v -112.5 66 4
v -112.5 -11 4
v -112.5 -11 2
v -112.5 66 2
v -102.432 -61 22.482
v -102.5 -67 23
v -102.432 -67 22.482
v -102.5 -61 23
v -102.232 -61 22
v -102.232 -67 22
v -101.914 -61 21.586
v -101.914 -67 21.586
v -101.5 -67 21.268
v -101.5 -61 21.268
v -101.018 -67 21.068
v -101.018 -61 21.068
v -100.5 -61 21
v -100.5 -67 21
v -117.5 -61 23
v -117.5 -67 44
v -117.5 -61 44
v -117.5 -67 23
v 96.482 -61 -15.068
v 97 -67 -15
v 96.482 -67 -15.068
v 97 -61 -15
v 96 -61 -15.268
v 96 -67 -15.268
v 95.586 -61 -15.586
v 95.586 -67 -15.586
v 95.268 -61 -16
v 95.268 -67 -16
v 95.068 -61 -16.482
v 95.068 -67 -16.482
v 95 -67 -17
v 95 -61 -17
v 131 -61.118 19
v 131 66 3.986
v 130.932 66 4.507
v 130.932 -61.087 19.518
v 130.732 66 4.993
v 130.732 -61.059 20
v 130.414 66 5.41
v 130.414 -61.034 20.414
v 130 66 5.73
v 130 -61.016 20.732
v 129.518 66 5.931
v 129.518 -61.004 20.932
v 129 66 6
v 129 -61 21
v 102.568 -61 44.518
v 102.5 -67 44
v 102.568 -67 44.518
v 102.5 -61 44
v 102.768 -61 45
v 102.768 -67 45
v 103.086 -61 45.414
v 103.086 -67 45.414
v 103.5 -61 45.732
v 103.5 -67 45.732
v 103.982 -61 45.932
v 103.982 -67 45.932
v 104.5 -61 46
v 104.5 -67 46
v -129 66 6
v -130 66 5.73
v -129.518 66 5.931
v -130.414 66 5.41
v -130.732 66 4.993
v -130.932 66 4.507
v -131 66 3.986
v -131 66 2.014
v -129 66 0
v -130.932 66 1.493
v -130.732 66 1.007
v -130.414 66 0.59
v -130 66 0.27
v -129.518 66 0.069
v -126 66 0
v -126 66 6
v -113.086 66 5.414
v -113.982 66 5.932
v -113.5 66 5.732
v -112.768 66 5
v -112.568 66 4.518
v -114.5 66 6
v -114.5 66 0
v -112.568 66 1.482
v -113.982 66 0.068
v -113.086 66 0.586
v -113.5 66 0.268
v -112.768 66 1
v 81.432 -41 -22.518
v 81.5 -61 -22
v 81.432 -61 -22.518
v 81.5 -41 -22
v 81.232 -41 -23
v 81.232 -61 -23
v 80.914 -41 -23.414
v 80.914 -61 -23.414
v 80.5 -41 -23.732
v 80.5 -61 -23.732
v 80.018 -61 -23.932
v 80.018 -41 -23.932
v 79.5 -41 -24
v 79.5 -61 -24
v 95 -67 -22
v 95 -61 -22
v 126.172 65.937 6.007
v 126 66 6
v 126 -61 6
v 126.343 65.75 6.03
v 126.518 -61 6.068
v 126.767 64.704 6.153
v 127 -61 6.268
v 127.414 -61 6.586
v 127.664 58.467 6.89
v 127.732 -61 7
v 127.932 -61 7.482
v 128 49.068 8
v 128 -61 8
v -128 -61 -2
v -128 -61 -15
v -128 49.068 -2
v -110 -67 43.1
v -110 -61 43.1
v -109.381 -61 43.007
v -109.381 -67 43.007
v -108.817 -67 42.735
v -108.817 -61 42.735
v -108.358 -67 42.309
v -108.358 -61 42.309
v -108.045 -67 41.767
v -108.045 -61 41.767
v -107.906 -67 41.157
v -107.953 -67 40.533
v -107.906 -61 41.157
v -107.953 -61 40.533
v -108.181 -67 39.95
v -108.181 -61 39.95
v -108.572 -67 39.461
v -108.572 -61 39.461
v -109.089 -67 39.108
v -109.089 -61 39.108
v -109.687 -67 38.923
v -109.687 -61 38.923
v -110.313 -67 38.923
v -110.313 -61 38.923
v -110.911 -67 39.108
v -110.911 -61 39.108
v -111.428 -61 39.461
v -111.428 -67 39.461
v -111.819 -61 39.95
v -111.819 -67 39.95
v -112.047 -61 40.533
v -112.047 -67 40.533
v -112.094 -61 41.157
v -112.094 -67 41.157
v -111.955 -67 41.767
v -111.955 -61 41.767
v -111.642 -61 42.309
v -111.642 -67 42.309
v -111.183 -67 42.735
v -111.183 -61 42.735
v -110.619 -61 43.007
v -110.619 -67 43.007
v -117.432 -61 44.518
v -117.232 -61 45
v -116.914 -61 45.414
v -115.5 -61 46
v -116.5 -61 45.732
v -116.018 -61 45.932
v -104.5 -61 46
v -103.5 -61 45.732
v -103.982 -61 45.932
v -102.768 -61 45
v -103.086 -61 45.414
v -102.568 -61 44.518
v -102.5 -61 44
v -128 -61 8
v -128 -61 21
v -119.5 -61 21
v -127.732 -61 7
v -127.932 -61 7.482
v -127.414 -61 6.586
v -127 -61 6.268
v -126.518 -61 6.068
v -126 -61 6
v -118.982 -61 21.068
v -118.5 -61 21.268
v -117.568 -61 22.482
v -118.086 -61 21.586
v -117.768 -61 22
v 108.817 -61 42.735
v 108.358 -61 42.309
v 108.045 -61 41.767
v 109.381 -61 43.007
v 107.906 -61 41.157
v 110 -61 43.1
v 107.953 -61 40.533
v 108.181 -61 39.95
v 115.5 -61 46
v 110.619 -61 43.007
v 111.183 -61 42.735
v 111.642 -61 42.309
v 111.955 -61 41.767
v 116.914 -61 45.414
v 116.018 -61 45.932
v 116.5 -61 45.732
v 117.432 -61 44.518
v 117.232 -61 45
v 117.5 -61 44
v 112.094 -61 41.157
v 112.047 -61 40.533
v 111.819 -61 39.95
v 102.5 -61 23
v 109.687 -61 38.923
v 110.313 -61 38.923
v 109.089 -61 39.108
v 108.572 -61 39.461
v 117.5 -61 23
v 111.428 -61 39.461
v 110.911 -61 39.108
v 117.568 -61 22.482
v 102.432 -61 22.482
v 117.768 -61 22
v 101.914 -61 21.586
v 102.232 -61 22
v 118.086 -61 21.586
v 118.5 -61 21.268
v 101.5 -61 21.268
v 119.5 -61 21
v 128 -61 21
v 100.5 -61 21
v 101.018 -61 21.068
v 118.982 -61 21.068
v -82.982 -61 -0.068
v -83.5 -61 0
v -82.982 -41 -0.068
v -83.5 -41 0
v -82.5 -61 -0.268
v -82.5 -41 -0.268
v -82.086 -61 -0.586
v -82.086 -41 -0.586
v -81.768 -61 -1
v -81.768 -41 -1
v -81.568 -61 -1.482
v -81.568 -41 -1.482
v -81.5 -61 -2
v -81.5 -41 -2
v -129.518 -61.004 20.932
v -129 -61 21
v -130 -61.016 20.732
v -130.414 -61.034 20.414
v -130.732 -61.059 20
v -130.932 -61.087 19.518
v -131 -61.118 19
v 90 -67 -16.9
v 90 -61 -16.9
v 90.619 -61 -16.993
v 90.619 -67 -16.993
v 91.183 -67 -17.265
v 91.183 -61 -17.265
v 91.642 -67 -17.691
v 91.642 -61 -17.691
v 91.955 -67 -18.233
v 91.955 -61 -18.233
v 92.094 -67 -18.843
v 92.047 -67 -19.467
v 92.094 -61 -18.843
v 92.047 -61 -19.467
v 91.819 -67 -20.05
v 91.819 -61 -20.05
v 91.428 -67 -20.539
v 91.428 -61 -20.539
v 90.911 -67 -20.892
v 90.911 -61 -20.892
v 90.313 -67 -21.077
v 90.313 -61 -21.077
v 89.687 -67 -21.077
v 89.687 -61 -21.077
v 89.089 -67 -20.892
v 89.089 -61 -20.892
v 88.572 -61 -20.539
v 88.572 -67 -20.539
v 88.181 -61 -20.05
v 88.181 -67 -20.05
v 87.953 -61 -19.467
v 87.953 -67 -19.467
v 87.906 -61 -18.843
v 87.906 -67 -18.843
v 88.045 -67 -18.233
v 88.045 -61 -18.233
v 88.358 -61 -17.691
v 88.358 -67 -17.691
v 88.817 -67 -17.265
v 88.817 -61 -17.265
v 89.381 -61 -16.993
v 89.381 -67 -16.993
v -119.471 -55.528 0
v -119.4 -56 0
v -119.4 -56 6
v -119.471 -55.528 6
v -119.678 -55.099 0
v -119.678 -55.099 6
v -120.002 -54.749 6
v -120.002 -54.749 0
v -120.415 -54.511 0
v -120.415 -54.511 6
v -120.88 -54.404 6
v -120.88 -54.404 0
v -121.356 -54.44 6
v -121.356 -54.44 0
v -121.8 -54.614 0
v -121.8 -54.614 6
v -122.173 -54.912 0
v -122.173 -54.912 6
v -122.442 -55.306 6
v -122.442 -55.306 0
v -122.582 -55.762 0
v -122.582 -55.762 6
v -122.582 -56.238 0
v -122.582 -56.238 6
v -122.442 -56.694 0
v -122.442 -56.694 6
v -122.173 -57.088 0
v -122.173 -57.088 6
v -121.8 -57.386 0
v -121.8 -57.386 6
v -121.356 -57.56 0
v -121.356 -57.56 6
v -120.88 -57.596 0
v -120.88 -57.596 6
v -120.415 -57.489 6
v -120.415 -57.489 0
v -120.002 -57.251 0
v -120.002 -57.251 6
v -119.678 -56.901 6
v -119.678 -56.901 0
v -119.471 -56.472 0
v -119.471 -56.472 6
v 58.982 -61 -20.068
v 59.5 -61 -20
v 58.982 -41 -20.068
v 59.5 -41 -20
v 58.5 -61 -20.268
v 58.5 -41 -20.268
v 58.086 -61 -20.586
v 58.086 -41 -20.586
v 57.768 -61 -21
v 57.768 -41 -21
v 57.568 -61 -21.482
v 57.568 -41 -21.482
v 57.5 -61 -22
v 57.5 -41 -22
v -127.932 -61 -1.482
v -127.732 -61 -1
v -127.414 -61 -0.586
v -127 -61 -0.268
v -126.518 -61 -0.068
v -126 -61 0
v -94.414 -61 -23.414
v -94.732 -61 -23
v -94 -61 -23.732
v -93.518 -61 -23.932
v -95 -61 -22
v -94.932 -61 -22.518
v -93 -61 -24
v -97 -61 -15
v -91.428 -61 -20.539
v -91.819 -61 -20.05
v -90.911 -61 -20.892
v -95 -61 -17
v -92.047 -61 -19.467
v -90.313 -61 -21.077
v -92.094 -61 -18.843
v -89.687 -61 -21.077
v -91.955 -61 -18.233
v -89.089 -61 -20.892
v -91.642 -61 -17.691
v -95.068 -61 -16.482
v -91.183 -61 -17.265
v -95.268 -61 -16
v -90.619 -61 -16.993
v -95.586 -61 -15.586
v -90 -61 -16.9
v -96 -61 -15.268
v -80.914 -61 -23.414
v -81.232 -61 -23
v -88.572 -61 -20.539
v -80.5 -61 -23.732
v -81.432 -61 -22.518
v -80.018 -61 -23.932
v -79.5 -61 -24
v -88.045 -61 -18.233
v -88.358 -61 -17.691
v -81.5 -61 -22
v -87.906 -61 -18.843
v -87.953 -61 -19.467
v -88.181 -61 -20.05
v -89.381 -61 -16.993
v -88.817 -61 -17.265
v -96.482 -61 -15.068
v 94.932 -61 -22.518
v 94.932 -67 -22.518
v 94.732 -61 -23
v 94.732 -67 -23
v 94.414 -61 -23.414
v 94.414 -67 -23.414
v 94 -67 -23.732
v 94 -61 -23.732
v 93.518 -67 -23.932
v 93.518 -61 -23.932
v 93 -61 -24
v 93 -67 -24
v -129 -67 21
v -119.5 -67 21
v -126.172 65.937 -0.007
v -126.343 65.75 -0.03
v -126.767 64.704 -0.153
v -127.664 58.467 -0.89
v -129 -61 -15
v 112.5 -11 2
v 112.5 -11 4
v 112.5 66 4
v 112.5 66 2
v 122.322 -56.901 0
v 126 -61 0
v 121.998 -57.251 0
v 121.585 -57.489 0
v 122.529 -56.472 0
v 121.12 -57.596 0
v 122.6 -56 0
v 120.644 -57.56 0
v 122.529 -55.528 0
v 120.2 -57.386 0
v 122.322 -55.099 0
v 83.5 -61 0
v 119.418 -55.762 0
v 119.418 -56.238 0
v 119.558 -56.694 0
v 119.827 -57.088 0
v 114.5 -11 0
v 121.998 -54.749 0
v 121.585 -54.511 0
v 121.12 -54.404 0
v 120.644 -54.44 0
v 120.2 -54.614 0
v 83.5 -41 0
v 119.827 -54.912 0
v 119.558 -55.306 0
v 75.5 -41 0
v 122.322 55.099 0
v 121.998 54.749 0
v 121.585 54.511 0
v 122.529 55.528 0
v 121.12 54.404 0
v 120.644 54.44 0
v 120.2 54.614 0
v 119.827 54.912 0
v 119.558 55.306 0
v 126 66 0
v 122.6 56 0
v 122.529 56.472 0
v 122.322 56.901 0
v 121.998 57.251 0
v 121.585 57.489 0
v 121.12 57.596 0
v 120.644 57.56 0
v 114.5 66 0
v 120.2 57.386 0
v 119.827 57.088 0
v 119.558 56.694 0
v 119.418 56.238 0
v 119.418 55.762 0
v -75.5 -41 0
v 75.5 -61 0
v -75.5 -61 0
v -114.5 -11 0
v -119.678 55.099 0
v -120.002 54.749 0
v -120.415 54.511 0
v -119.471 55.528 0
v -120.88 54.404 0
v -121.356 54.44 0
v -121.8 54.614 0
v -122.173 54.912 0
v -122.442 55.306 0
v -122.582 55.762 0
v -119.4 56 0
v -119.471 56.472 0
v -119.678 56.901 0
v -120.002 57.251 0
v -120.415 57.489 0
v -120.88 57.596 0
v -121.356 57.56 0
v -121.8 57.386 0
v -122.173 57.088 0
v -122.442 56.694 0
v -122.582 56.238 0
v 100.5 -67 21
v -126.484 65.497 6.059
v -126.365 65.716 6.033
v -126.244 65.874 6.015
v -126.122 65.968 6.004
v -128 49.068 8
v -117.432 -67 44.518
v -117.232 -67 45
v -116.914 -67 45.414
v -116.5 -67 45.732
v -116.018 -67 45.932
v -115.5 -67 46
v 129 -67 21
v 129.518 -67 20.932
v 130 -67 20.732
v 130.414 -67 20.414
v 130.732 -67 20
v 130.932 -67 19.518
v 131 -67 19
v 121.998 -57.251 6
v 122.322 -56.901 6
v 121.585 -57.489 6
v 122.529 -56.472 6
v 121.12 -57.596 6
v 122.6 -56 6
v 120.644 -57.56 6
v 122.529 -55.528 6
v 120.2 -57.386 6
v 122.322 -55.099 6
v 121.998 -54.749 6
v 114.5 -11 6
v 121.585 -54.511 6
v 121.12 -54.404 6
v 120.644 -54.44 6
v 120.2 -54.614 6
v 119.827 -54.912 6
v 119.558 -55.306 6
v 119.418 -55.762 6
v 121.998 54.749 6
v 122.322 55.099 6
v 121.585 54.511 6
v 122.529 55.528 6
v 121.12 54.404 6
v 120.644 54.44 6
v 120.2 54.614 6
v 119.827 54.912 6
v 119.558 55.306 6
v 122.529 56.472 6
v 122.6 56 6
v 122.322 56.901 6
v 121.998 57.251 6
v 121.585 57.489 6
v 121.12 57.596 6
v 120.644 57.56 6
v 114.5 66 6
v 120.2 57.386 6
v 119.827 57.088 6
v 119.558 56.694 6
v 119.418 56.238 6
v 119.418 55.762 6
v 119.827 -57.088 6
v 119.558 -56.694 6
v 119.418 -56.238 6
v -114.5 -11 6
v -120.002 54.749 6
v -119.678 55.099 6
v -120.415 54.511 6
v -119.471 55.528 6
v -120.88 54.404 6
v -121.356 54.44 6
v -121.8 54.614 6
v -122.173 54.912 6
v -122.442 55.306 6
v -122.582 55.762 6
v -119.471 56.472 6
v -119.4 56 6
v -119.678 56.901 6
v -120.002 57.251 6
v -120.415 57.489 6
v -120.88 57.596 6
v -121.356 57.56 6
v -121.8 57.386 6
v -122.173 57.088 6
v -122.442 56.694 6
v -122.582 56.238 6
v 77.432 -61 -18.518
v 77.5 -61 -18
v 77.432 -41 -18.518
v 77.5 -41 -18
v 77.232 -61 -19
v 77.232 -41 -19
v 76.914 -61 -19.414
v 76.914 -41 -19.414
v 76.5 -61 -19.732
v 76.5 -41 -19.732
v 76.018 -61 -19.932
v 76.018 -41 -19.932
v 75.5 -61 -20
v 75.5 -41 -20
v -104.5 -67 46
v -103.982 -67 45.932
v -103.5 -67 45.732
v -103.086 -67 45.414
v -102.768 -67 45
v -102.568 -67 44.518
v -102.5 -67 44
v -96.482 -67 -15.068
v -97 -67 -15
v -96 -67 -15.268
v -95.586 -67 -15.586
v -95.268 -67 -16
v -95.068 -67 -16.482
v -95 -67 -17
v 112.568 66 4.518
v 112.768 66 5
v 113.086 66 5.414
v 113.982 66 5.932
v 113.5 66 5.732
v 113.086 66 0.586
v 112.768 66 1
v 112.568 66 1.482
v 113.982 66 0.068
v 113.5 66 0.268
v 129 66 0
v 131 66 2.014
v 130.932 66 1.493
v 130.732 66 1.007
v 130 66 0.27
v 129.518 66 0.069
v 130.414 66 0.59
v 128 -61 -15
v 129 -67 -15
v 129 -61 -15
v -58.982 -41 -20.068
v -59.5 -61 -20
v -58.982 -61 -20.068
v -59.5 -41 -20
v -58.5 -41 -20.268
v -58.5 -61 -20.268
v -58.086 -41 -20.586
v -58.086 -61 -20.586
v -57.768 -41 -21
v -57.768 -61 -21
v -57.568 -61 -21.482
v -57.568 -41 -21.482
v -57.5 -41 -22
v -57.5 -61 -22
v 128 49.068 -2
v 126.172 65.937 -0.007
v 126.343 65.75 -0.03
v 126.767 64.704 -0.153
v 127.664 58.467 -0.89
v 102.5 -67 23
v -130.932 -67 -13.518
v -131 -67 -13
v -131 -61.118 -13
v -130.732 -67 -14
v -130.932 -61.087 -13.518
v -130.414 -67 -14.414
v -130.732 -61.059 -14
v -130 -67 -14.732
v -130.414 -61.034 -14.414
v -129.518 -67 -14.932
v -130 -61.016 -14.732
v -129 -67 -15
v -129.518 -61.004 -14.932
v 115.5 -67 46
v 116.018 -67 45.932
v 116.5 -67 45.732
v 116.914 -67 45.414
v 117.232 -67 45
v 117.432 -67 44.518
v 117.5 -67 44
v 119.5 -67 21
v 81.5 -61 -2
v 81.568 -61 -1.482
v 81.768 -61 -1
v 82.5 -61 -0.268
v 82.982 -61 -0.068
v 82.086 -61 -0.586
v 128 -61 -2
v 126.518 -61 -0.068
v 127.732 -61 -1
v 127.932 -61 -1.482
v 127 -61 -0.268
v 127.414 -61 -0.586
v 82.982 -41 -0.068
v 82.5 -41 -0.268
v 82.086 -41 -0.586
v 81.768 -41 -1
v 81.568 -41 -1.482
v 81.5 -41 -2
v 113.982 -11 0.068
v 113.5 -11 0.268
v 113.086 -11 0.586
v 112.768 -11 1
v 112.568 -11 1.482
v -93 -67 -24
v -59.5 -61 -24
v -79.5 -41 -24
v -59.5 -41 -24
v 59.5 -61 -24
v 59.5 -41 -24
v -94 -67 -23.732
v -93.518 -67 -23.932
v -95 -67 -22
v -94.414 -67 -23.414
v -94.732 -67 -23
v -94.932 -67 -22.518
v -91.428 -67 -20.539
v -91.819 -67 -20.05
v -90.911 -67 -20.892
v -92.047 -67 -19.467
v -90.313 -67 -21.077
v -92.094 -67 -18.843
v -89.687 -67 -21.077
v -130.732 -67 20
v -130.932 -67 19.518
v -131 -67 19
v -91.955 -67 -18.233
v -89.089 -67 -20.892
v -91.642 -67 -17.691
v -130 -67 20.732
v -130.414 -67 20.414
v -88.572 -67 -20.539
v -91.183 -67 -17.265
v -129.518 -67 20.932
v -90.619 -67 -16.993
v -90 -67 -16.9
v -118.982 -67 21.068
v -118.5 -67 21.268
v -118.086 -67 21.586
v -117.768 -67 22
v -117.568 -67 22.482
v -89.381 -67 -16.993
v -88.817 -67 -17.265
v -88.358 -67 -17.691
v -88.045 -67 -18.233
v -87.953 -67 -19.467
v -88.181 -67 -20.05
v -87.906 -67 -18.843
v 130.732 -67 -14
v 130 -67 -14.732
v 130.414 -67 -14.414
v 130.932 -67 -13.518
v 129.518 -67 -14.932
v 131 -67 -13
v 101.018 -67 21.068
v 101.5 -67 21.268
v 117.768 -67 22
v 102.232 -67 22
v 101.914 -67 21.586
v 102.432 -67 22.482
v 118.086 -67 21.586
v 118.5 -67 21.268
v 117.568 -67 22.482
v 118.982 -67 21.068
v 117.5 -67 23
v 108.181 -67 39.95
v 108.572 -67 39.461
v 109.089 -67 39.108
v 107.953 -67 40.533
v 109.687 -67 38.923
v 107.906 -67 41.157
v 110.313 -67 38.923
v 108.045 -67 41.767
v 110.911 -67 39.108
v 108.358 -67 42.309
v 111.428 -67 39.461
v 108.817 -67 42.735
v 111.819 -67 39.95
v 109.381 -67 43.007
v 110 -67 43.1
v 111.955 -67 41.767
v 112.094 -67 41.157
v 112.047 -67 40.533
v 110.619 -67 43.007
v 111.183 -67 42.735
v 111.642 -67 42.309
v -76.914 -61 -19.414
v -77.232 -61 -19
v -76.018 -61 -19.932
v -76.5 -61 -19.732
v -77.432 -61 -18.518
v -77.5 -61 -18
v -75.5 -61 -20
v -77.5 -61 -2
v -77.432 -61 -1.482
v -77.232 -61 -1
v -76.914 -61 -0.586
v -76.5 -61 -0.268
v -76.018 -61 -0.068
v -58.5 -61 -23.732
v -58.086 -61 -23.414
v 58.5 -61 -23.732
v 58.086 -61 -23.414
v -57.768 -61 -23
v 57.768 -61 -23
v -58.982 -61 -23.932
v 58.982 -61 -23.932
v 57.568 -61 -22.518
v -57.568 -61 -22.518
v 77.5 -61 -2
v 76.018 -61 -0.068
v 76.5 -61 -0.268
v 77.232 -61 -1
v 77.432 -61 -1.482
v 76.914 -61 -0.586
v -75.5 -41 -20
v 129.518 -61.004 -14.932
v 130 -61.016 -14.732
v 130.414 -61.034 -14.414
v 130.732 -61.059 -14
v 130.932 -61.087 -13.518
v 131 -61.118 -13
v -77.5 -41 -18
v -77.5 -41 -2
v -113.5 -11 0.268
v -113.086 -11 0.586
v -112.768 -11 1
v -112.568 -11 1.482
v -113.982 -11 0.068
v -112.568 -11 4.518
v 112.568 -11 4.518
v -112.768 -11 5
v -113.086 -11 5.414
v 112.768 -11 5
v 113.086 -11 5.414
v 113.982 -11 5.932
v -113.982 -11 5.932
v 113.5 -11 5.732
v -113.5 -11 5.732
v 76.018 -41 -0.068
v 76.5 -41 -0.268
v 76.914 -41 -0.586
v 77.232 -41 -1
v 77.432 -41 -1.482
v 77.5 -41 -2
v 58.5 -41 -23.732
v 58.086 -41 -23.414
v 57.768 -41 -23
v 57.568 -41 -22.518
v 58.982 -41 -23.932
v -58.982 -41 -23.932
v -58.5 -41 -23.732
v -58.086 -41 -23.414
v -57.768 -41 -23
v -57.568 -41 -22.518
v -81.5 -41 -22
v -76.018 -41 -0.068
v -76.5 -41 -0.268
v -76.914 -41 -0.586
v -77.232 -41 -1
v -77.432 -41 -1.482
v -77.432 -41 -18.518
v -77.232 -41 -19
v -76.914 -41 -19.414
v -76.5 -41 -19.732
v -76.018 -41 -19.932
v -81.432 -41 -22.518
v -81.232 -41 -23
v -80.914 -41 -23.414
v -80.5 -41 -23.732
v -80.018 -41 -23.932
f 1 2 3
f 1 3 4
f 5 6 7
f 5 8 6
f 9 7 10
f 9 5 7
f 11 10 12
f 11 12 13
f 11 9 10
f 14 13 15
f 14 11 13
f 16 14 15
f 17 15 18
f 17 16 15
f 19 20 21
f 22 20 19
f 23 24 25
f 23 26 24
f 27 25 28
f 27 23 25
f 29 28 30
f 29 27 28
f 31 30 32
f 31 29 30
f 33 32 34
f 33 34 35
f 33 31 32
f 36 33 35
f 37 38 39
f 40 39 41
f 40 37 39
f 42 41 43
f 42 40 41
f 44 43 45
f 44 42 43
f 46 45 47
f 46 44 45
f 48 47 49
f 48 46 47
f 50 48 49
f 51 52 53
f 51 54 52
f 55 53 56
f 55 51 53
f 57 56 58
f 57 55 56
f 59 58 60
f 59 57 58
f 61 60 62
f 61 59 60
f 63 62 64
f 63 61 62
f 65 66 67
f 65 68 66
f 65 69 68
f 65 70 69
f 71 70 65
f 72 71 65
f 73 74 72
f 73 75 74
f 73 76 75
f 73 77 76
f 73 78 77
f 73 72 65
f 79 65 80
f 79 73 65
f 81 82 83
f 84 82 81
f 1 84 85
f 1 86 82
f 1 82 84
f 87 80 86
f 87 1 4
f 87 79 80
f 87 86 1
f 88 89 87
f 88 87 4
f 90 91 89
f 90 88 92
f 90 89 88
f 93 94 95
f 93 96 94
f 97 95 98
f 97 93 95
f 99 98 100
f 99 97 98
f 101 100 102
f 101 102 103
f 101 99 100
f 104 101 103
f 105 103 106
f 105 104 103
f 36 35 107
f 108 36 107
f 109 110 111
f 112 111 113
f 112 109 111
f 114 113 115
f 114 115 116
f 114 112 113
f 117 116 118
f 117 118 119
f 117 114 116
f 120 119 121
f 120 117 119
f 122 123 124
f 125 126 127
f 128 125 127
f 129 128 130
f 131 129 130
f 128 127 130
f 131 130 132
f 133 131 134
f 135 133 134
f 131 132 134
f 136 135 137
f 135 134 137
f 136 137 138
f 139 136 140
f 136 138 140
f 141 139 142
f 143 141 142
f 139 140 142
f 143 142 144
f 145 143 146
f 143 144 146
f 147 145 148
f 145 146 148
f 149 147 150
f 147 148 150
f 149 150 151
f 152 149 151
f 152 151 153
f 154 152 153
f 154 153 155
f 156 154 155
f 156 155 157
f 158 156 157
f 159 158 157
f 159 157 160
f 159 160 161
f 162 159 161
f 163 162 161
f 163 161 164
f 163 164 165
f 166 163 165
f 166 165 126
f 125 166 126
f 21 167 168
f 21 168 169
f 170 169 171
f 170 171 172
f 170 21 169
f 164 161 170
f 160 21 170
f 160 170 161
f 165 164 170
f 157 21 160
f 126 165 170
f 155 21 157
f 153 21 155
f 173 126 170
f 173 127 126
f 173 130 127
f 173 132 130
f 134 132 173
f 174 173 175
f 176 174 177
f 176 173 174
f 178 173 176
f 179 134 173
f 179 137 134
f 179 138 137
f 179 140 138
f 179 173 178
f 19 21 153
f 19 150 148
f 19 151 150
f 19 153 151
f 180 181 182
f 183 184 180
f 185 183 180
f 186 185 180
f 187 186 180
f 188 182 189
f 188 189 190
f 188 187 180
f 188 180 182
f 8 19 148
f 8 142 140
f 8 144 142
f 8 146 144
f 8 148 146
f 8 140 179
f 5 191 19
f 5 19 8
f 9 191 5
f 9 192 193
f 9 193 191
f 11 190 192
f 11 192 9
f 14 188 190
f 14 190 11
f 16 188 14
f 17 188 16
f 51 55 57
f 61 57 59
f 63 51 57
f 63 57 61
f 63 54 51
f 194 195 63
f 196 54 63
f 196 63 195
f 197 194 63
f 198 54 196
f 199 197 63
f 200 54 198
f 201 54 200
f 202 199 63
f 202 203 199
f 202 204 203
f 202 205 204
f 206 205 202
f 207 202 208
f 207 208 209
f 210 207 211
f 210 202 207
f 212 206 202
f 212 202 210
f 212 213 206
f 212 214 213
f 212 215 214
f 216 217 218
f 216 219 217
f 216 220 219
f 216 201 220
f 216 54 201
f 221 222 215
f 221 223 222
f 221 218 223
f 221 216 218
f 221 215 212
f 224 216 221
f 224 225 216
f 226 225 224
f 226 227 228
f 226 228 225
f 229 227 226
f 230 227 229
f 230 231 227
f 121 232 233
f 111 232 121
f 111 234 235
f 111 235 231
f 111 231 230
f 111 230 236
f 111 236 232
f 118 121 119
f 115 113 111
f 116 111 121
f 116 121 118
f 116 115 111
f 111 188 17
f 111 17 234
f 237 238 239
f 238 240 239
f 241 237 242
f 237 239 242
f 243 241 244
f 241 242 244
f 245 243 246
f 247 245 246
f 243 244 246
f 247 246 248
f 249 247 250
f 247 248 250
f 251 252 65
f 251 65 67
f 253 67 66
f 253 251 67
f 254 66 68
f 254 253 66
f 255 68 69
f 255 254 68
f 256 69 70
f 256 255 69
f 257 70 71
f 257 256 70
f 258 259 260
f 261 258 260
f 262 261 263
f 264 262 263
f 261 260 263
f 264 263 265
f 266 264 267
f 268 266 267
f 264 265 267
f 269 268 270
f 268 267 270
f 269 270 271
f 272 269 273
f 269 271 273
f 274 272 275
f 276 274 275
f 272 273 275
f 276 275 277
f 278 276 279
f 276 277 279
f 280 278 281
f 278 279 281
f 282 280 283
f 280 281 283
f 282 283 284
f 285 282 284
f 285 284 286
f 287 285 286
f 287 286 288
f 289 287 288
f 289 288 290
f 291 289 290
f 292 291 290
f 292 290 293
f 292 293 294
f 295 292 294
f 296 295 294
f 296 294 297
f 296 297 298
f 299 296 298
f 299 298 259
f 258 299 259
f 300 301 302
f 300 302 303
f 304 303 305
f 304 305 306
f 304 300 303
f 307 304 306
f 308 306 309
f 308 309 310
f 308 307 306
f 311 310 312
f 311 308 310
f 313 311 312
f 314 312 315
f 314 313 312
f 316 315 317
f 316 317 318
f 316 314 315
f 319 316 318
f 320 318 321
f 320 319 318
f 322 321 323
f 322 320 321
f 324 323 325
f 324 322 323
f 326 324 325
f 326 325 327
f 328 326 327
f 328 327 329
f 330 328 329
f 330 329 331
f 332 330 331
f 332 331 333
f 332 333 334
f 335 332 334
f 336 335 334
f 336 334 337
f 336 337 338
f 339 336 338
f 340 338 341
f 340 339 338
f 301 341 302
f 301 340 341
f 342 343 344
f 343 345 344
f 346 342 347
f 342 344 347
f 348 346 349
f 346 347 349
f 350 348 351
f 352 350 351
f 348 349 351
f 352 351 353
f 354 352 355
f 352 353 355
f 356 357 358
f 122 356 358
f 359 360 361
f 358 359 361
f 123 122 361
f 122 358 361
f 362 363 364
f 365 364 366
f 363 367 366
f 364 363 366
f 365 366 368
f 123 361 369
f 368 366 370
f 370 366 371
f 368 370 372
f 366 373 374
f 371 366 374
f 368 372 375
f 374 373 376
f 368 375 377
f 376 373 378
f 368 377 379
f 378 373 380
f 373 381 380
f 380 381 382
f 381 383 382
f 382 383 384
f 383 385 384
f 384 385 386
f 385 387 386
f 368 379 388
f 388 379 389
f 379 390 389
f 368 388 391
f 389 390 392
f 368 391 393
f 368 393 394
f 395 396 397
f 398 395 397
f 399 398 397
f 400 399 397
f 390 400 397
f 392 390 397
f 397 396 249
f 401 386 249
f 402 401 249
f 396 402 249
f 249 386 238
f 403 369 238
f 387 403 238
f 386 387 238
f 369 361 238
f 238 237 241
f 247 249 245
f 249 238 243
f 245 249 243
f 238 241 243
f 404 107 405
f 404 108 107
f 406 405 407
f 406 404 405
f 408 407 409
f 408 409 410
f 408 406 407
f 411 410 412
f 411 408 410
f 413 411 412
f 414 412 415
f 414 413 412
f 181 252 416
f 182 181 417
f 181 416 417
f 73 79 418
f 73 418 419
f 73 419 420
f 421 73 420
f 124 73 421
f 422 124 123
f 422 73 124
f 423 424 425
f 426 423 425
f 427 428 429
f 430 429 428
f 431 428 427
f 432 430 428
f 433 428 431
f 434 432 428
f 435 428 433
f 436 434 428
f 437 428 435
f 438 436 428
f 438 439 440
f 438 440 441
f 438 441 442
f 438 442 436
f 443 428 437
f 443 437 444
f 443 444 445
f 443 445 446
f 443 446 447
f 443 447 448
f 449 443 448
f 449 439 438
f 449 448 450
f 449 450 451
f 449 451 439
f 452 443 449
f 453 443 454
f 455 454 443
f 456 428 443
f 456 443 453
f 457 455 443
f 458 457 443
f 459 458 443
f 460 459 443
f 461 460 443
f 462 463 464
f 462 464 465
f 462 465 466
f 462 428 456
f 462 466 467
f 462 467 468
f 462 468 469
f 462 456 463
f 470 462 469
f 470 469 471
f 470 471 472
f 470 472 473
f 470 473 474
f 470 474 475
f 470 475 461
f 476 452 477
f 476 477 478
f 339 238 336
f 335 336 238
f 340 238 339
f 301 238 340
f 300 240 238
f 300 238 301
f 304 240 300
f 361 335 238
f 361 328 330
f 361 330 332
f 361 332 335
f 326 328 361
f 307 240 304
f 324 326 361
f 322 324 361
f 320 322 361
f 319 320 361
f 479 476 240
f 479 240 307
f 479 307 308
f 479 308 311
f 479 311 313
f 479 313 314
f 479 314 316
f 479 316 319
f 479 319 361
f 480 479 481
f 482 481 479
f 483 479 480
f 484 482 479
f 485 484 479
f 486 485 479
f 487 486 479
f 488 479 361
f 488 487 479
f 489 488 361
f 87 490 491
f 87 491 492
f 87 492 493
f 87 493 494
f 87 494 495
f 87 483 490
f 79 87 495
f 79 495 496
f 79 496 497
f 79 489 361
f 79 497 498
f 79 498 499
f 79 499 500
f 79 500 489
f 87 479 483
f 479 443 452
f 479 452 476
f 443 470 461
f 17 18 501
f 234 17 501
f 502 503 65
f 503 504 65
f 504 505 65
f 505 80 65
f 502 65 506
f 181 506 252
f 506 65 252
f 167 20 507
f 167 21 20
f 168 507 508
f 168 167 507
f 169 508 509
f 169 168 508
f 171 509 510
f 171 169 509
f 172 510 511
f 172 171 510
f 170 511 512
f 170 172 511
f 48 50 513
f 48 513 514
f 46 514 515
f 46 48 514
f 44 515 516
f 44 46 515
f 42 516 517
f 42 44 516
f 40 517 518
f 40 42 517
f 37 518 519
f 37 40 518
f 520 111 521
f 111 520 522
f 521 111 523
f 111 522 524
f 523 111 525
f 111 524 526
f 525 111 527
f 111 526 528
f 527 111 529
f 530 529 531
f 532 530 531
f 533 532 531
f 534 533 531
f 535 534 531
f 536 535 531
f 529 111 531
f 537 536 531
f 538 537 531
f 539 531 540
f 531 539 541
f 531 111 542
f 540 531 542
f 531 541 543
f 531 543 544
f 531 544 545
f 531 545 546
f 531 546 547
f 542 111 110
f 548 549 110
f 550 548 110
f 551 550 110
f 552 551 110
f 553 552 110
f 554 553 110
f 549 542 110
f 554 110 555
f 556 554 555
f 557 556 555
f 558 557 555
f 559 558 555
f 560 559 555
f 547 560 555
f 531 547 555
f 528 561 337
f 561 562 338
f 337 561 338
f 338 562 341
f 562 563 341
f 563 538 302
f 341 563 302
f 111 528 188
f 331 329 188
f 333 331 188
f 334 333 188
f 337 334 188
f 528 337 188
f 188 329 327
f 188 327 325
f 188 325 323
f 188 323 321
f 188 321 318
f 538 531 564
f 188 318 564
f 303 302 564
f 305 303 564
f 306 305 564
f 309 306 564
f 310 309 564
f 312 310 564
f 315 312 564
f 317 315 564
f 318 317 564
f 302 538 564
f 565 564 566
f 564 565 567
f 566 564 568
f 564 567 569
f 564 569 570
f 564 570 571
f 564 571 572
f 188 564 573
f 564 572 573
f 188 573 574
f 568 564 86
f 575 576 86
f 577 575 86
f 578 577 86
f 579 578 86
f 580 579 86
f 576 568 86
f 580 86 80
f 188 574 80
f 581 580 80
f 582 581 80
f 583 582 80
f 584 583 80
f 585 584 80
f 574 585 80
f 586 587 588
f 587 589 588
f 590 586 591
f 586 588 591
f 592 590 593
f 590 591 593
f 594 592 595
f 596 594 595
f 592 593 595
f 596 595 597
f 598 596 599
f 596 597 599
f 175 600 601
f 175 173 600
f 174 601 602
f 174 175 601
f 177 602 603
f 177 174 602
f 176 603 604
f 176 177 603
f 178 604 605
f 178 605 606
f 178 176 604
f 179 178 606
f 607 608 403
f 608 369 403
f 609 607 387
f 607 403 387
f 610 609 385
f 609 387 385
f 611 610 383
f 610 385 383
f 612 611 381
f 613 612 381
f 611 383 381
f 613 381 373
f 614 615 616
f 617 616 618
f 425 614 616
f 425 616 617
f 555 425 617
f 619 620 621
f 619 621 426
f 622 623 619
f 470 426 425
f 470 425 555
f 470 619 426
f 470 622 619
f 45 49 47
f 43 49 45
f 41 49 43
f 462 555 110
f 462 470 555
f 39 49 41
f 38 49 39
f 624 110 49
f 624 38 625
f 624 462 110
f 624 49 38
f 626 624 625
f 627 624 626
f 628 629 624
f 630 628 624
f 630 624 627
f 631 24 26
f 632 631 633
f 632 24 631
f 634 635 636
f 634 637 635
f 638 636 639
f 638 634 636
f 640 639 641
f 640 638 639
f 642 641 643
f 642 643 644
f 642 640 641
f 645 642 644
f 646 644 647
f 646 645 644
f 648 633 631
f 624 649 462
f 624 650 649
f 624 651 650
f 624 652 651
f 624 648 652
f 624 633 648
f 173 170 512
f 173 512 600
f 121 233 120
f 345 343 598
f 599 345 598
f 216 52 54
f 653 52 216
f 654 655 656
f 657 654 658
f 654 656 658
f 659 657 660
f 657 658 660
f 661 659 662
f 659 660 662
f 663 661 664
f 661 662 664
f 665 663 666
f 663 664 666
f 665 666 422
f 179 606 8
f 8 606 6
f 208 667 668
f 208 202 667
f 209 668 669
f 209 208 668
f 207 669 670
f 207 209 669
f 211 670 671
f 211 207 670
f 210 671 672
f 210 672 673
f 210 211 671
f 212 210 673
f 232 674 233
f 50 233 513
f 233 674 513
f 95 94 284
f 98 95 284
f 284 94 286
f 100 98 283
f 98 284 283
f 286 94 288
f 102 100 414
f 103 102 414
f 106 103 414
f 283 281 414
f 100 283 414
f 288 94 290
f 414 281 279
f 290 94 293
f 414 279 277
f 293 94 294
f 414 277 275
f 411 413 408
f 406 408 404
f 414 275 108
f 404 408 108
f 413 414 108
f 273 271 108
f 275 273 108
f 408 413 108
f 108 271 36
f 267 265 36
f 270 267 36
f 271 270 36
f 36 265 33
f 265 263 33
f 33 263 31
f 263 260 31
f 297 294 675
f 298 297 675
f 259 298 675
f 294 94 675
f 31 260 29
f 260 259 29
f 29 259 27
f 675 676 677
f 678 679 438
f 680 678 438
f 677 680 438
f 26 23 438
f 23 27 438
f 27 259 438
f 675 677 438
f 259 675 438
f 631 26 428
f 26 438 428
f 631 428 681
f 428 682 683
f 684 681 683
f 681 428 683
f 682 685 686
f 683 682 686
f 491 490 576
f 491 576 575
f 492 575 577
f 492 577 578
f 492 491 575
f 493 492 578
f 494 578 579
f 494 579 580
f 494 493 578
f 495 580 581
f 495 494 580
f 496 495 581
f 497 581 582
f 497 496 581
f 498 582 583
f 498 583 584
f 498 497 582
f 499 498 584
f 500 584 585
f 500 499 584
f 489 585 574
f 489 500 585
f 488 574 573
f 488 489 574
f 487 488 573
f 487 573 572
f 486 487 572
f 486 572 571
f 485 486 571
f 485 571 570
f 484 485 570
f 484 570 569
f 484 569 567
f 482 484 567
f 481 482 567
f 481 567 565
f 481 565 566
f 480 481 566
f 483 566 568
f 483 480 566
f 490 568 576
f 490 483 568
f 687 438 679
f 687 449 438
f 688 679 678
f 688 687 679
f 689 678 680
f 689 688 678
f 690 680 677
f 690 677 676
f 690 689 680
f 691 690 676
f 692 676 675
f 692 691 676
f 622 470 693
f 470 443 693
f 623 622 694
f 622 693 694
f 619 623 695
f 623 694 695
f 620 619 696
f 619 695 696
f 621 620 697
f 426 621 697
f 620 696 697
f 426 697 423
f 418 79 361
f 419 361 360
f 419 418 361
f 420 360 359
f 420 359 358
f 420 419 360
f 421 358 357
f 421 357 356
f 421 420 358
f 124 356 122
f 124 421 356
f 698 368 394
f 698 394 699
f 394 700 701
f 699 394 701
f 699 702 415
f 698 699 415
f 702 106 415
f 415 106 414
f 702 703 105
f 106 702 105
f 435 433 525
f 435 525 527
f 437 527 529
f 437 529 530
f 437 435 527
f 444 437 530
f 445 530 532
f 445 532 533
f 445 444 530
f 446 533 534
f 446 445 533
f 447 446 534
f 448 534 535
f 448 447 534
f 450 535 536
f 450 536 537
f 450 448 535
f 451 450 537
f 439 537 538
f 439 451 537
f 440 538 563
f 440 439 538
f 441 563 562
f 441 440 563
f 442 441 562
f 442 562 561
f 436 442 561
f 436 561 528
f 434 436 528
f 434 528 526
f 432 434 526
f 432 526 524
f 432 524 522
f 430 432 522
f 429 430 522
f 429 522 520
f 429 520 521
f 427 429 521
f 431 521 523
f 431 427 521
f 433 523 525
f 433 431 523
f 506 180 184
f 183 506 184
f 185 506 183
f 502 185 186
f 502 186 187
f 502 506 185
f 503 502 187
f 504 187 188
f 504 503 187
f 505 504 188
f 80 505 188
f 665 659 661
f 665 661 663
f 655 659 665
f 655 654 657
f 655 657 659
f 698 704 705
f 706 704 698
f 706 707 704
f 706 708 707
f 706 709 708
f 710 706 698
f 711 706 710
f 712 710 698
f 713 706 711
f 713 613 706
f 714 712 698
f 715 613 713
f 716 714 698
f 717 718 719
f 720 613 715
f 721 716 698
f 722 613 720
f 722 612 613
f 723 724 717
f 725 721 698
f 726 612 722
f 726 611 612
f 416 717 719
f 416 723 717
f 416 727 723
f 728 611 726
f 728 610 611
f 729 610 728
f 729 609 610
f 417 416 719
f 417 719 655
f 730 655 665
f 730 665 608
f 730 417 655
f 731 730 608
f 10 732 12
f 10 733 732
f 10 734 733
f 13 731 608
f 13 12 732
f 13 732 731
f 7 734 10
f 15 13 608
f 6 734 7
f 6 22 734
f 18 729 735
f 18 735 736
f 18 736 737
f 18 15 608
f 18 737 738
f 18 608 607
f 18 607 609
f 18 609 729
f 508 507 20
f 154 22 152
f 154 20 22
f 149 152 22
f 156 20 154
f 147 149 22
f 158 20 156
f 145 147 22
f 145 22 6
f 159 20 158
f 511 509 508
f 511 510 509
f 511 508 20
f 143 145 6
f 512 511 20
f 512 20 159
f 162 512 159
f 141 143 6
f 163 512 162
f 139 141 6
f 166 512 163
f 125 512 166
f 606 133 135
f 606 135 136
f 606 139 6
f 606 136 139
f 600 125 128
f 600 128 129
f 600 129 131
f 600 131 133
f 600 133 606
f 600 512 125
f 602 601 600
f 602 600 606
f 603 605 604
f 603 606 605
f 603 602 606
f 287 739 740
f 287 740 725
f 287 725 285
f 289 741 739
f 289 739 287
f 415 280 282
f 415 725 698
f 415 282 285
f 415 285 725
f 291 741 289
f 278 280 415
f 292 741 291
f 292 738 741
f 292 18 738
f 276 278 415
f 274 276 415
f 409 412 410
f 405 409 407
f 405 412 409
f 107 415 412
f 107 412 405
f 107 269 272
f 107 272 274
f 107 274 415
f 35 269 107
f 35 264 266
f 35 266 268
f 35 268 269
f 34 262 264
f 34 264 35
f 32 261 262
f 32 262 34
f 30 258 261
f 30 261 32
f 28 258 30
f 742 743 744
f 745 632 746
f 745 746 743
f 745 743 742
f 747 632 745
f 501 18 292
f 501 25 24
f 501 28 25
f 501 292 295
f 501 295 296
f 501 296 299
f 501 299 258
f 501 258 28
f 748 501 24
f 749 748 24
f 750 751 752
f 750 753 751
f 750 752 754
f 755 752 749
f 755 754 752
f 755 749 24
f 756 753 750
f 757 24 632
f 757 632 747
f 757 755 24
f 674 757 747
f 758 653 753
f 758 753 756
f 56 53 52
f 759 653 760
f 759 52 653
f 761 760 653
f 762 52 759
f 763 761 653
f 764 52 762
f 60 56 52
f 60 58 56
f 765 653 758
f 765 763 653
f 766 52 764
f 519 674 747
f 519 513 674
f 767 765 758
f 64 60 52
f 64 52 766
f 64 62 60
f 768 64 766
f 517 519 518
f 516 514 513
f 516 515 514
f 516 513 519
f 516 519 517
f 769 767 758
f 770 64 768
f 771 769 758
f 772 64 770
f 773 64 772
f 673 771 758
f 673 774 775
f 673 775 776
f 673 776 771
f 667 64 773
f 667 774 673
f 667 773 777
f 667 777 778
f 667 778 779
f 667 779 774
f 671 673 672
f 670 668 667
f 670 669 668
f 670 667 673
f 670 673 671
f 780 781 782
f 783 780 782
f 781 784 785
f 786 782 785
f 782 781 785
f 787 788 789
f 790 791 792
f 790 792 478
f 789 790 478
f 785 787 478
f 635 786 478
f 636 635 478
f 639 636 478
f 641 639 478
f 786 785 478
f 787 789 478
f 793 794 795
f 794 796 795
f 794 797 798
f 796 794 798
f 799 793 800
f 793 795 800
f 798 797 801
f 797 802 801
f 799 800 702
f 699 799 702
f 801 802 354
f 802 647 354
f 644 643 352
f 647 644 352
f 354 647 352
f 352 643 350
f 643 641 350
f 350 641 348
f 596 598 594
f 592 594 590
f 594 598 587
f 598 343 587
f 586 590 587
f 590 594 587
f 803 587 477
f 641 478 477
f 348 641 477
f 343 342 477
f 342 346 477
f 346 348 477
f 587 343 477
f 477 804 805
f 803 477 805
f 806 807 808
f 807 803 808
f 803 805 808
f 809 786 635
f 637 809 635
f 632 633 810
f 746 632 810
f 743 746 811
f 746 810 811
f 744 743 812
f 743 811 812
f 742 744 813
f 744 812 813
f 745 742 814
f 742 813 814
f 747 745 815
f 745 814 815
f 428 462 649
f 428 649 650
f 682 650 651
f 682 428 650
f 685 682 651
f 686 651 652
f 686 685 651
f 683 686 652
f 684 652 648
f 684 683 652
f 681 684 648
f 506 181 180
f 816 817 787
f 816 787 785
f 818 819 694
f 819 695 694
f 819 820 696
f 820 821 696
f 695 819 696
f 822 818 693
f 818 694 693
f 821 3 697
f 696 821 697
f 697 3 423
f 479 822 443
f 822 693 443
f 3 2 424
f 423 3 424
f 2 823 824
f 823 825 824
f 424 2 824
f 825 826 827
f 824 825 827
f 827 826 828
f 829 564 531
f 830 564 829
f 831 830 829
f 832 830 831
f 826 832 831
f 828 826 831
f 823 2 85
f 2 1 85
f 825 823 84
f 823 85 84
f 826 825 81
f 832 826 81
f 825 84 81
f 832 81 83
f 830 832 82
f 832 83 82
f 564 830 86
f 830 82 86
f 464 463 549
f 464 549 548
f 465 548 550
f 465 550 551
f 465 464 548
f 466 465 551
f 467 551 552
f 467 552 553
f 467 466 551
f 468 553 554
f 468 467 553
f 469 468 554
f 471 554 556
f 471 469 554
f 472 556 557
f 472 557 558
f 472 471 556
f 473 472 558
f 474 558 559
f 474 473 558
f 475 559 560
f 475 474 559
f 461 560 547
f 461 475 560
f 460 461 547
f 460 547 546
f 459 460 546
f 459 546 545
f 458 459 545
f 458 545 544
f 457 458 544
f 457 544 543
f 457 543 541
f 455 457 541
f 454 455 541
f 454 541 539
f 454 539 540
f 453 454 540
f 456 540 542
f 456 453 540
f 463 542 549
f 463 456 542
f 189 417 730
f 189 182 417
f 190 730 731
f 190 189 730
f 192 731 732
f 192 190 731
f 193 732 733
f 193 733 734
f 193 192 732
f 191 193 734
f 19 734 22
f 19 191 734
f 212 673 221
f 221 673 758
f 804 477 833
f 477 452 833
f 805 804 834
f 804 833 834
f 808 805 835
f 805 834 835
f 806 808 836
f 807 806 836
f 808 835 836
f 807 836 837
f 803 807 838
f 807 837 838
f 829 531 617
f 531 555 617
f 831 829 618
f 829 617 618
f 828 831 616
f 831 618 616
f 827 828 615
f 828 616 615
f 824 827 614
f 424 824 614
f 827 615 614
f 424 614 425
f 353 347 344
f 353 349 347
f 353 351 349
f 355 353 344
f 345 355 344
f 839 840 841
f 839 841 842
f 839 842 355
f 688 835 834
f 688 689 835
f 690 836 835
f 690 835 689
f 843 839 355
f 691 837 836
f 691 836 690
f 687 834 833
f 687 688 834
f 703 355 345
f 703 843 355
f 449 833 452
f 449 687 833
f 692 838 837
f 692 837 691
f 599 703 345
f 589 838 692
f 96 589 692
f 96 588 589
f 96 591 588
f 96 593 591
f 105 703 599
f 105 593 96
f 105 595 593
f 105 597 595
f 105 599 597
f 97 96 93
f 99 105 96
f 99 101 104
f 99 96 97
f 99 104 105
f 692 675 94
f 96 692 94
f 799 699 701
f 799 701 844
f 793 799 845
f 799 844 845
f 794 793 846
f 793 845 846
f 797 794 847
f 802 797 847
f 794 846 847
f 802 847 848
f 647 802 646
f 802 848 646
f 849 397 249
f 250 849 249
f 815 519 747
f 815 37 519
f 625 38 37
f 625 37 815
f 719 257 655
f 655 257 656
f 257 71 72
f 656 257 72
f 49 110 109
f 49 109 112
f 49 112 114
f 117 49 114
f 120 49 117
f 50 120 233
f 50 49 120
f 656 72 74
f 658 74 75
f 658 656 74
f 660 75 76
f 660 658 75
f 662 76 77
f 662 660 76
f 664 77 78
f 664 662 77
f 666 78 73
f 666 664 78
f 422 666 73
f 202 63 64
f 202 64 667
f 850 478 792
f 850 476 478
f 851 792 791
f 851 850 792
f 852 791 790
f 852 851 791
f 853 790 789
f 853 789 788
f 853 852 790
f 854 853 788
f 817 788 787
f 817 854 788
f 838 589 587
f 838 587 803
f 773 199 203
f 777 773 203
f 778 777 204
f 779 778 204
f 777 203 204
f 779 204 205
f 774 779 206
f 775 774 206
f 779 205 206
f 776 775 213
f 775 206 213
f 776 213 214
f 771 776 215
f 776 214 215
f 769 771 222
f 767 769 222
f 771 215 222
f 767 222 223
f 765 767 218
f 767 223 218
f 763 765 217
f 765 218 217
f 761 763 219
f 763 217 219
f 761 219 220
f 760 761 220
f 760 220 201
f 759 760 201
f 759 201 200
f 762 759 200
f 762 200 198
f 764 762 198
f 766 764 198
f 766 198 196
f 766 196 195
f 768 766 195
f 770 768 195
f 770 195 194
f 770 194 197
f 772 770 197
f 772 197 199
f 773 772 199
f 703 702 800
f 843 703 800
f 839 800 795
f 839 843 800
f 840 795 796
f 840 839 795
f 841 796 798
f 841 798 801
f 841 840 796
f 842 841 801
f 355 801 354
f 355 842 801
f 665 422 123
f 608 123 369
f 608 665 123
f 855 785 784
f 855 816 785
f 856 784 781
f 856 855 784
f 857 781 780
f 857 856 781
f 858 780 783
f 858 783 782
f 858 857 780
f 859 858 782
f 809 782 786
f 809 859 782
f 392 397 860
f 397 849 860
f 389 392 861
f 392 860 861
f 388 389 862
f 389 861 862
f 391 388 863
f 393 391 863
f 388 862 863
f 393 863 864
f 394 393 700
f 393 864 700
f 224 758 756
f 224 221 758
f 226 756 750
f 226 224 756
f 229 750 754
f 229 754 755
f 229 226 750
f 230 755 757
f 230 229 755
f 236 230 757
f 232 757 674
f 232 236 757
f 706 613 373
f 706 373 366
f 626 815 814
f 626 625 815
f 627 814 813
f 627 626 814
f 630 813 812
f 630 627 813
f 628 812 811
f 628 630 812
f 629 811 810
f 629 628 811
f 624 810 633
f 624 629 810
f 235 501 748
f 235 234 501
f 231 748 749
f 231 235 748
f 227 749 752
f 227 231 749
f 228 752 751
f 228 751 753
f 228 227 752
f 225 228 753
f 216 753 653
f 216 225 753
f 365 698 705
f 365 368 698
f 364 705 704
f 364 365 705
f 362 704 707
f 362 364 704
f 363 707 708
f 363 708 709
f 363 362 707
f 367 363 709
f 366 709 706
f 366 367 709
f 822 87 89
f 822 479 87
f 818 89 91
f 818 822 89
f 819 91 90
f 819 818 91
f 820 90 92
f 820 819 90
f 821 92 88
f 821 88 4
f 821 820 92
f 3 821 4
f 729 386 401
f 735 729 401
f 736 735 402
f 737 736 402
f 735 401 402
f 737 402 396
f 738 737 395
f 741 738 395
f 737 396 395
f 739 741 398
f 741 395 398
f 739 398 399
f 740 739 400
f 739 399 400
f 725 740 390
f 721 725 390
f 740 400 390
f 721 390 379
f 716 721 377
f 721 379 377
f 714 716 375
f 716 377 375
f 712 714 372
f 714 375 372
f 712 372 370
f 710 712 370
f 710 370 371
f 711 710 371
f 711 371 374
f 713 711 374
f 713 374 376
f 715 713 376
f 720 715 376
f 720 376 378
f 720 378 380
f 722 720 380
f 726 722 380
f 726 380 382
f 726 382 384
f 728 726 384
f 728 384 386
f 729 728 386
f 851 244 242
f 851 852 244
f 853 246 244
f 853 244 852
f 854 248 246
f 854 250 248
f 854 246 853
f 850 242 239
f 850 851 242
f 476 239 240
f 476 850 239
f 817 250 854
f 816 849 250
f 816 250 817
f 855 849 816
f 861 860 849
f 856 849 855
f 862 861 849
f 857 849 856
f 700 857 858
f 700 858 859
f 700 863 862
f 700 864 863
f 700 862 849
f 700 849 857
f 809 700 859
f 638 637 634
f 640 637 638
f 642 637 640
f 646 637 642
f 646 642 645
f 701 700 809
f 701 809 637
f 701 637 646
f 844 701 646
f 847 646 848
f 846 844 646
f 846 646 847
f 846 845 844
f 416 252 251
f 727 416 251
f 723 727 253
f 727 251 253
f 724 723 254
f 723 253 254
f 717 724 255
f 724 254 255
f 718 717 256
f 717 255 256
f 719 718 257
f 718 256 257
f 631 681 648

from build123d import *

# Parameters (mm, degrees)
SKETCH1_R               = 1.6
BOSS_EXTRUDE1_DEPTH     = 6
SKETCH5_W               = 262
SKETCH5_H               = 6
BOSS_EXTRUDE3_DEPTH     = 40
SKETCH5_2_W             = 262
SKETCH5_2_H             = 6
BOSS_EXTRUDE5_DEPTH     = 30
SKETCH3_R               = 2.1
CUT_EXTRUDE1_DEPTH      = 189.164821367
SKETCH6_W               = 225
SKETCH6_H               = 77
CUT_EXTRUDE2_DEPTH      = 153.47950682
BOSS_EXTRUDE7_DEPTH     = 20
CUT_EXTRUDE4_DEPTH      = 189.164821367
CUT_EXTRUDE4_DEPTH_BACK = 189.164821367
SKETCH11_W              = 36
SKETCH11_H              = 9
SKETCH11_W_2            = 13.5
SKETCH11_H_2            = 25
SKETCH11_W_3            = 205
BOSS_EXTRUDE4_DEPTH     = 3
BOSS_EXTRUDE6_DEPTH     = 3
FILLET1_R               = 2


with BuildPart() as part:
    # Sketch1 → Boss-Extrude1 (new body)
    with BuildSketch(Plane.XY):
        Polygon((-131, -66), (-131, 66), (131, 66), (131, -66), (131, -67), (-131, -67), align=None)
        with Locations((-121, 56)):
            Circle(SKETCH1_R, mode=Mode.SUBTRACT)
        with Locations((121, 56)):
            Circle(SKETCH1_R, mode=Mode.SUBTRACT)
        with Locations((121, -56)):
            Circle(SKETCH1_R, mode=Mode.SUBTRACT)
        with Locations((-121, -56)):
            Circle(SKETCH1_R, mode=Mode.SUBTRACT)
    extrude(amount=BOSS_EXTRUDE1_DEPTH)

    # Sketch5 → Boss-Extrude3 (add)
    with BuildSketch(Plane.XY.offset(6)):
        with Locations((0, -64)):
            Rectangle(SKETCH5_W, SKETCH5_H)
    extrude(amount=BOSS_EXTRUDE3_DEPTH)

    # Sketch5<2> → Boss-Extrude5 (add)
    with BuildSketch(Plane.XY.offset(6)):
        with Locations((0, -64)):
            Rectangle(SKETCH5_2_W, SKETCH5_2_H)
    extrude(amount=-BOSS_EXTRUDE5_DEPTH)

    # Sketch3 → Cut-Extrude1 (cut, through all)
    with BuildSketch(Plane(origin=(0, -61, 0), x_dir=(1, 0, 0), z_dir=(0, 1, 0))):
        with Locations(Location((-110, -41, 0), (0, 0, 270))):
            Circle(SKETCH3_R)
        with Locations(Location((110, -41, 0), (0, 0, 270))):
            Circle(SKETCH3_R)
        with Locations(Location((-90, 19, 0), (0, 0, 270))):
            Circle(SKETCH3_R)
        with Locations(Location((90, 19, 0), (0, 0, 270))):
            Circle(SKETCH3_R)
    extrude(amount=-CUT_EXTRUDE1_DEPTH, mode=Mode.SUBTRACT)

    # Sketch6 → Cut-Extrude2 (cut, through all)
    with BuildSketch(Plane.XY.offset(6)):
        with Locations((0, 27.5)):
            Rectangle(SKETCH6_W, SKETCH6_H)
    extrude(amount=-CUT_EXTRUDE2_DEPTH, mode=Mode.SUBTRACT)

    # Sketch9 → Boss-Extrude7 (add)
    with BuildSketch(Plane(origin=(0, -61, 0), x_dir=(1, 0, 0), z_dir=(0, 1, 0))):
        Polygon((-81.5, 24), (-81.5, 0), (-77.5, 0), (-77.5, 20), (-57.5, 20), (-57.5, 24), align=None)
        Polygon((77.5, 20), (77.5, 0), (81.5, 0), (81.5, 24), (57.5, 24), (57.5, 20), align=None)
    extrude(amount=BOSS_EXTRUDE7_DEPTH)

    # Sketch11 → Cut-Extrude4 (cut, two sides: drawn at the far end of the back side and taken through both)
    with BuildSketch(Plane(origin=(0, -61, 0), x_dir=(1, 0, 0), z_dir=(0, 1, 0)).offset(-CUT_EXTRUDE4_DEPTH_BACK)):
        with Locations((-113, 19.5)):
            Rectangle(SKETCH11_W, SKETCH11_H)
        with Locations((113, 19.5)):
            Rectangle(SKETCH11_W, SKETCH11_H)
        with Locations((124.25, -33.5)):
            Rectangle(SKETCH11_W_2, SKETCH11_H_2)
        with Locations((-124.25, -33.5)):
            Rectangle(SKETCH11_W_2, SKETCH11_H_2)
        with Locations((0, -33.5)):
            Rectangle(SKETCH11_W_3, SKETCH11_H_2)
    extrude(amount=CUT_EXTRUDE4_DEPTH + CUT_EXTRUDE4_DEPTH_BACK, mode=Mode.SUBTRACT)

    # Sketch8 → Boss-Extrude4 (add)
    with BuildSketch(Plane(origin=(131, 0, 0), x_dir=(0, 0, -1), z_dir=(1, 0, 0))):
        Polygon((-6, 66), (-21, -61), (-6, -61), align=None)
        Polygon((0, 66), (0, -61), (15, -61), align=None)
    extrude(amount=-BOSS_EXTRUDE4_DEPTH)

    # Sketch7 → Boss-Extrude6 (add)
    with BuildSketch(Plane.ZY.offset(131)):
        Polygon((6, 66), (21, -61), (6, -61), align=None)
        Polygon((0, 66), (-15, -61), (0, -61), align=None)
    extrude(amount=-BOSS_EXTRUDE6_DEPTH)

    # Fillet1
    fillet1_edges = [part.edges().sort_by_distance(p)[0] for p in [
        (128, 2.5, 6),
        (128, 2.5, 0),
        (-128, 2.5, 0),
        (-131, 2.5, -7.5),
        (-131, 2.5, 13.5),
        (-128, 2.5, 6),
        (131, 2.5, -7.5),
        (131, 2.5, 13.5),
        (-112.5, 27.5, 6),
        (-112.5, 27.5, 0),
        (112.5, 27.5, 6),
        (112.5, 27.5, 0),
        (-131, -64, -15),
        (-95, -64, -15),
        (-95, -64, -24),
        (-81.5, -51, 0),
        (81.5, -51, 0),
        (95, -64, -24),
        (95, -64, -15),
        (131, -64, -15),
        (-131, -64, 21),
        (-117.5, -64, 21),
        (102.5, -64, 21),
        (131, -64, 21),
        (-102.5, -64, 21),
        (117.5, -64, 21),
        (102.5, -64, 46),
        (117.5, -64, 46),
        (-117.5, -64, 46),
        (-102.5, -64, 46),
        (77.5, -51, 0),
        (-77.5, -51, 0),
        (-77.5, -51, -20),
        (77.5, -51, -20),
        (57.5, -51, -20),
        (-57.5, -51, -20),
        (-81.5, -51, -24),
        (-57.5, -51, -24),
        (57.5, -51, -24),
        (81.5, -51, -24),
    ]]
    fillet(fillet1_edges, radius=FILLET1_R - 0.0001)  # a hair under: the kernel refuses the full size


solid = part.part
